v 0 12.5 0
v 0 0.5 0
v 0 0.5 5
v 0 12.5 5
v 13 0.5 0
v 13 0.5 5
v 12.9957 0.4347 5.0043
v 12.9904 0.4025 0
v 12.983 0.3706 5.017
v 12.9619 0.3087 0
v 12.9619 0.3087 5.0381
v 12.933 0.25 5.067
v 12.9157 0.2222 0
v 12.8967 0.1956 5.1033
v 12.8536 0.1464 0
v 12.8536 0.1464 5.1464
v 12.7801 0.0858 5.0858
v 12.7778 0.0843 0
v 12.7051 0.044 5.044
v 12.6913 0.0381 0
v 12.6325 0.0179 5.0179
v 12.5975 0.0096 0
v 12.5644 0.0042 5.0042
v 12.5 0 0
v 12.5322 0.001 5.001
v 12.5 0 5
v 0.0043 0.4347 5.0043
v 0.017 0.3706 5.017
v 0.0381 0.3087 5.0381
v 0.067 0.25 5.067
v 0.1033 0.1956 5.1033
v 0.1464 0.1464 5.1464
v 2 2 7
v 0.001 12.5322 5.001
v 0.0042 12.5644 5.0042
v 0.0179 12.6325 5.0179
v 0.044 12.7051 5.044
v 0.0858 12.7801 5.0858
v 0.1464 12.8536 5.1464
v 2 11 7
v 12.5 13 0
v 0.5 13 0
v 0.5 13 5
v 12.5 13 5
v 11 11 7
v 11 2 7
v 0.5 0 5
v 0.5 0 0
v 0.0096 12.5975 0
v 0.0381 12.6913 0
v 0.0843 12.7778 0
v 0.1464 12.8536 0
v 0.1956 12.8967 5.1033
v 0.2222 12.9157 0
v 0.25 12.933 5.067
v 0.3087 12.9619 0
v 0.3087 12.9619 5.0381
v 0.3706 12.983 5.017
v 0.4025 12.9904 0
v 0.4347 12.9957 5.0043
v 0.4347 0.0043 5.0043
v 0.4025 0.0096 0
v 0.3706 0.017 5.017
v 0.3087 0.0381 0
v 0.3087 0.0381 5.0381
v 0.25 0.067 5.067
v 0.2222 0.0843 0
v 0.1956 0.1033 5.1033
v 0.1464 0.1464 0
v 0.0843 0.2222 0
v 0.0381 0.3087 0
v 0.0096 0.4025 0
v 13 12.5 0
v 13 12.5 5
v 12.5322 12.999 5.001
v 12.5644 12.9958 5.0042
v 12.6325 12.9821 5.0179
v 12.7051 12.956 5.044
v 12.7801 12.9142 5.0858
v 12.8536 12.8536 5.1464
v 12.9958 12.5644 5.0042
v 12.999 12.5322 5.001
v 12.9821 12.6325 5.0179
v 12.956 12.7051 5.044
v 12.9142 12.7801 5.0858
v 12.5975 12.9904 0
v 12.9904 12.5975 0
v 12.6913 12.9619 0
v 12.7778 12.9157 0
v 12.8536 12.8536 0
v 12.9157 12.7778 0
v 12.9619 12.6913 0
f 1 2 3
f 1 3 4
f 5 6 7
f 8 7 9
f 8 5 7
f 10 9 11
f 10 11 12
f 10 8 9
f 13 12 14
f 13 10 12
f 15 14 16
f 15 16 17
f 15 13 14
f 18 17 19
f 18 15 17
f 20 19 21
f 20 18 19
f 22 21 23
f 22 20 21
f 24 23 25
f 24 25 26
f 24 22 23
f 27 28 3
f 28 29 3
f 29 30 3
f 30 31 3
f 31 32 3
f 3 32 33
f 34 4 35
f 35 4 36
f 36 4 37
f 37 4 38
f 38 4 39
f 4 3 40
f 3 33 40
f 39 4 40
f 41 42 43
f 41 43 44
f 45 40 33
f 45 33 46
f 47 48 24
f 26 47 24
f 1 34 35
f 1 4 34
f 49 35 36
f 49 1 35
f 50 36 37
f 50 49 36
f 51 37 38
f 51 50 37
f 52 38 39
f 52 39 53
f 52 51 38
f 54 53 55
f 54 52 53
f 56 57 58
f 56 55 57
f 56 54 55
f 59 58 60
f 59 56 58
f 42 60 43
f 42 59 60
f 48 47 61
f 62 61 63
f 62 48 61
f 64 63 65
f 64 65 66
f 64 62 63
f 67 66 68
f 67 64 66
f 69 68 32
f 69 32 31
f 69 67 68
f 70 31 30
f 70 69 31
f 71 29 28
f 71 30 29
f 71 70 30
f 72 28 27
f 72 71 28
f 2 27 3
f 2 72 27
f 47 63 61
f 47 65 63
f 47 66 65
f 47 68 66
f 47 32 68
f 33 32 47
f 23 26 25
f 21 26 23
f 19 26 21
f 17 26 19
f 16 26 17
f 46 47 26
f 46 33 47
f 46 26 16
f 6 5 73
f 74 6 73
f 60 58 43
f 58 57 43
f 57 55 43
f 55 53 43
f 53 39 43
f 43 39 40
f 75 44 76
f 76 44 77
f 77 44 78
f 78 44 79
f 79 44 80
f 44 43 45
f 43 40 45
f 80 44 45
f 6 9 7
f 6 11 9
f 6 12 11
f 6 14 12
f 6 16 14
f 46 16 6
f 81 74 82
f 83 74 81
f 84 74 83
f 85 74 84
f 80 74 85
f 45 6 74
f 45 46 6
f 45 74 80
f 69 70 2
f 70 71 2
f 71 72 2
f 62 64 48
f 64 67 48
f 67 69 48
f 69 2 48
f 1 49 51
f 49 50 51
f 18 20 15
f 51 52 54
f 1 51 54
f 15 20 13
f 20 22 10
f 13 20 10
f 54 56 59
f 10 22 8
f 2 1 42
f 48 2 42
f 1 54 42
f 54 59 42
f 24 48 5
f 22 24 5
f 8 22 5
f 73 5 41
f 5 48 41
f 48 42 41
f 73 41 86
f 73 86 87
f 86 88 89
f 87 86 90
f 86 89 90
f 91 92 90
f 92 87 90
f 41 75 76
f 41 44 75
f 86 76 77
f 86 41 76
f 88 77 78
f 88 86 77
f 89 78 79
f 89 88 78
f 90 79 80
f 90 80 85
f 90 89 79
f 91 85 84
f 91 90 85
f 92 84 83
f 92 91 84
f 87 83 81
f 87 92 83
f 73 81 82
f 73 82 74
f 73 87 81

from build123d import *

# Parameters (mm, degrees)
SKETCH_W     = 13
SKETCH_H     = 13
PAD_DEPTH    = 7
CHAMFER_SIZE = 2
POCKET_DEPTH = 7


with BuildPart() as part:
    # Sketch → Pad (new body)
    with BuildSketch(Plane.XY):
        with Locations((6.5, 6.5)):
            Rectangle(SKETCH_W, SKETCH_H)
    extrude(amount=PAD_DEPTH)

    # Chamfer
    chamfer_edges = [part.edges().sort_by_distance(p)[0] for p in [
        (0, 6.5, 7),
        (6.5, 13, 7),
        (6.5, 0, 7),
        (13, 6.5, 7),
    ]]
    chamfer(chamfer_edges, length=CHAMFER_SIZE)

    # Sketch002 (on Face4 of Chamfer) → Pocket (cut)
    with BuildSketch(Plane(origin=(0, 0, 0), x_dir=(1, 0, 0), z_dir=(0, 0, -1))):
        with BuildLine():
            Line((0, 0), (0, -0.5))
            ThreePointArc((0.5, 0), (0.146447, -0.146447), (0, -0.5))
            Line((0, 0), (0.5, 0))
        make_face()
        with BuildLine():
            Line((13, 0), (12.5, 0))
            ThreePointArc((13, -0.5), (12.853553, -0.146447), (12.5, 0))
            Line((13, 0), (13, -0.5))
        make_face()
        with BuildLine():
            Line((0, -12.5), (0, -13))
            Line((0, -13), (0.5, -13))
            ThreePointArc((0, -12.5), (0.146447, -12.853553), (0.5, -13))
        make_face()
        with BuildLine():
            Line((13, -12.5), (13, -13))
            Line((13, -13), (12.5, -13))
            ThreePointArc((12.5, -13), (12.853553, -12.853553), (13, -12.5))
        make_face()
    extrude(amount=-POCKET_DEPTH, mode=Mode.SUBTRACT)


solid = part.part
